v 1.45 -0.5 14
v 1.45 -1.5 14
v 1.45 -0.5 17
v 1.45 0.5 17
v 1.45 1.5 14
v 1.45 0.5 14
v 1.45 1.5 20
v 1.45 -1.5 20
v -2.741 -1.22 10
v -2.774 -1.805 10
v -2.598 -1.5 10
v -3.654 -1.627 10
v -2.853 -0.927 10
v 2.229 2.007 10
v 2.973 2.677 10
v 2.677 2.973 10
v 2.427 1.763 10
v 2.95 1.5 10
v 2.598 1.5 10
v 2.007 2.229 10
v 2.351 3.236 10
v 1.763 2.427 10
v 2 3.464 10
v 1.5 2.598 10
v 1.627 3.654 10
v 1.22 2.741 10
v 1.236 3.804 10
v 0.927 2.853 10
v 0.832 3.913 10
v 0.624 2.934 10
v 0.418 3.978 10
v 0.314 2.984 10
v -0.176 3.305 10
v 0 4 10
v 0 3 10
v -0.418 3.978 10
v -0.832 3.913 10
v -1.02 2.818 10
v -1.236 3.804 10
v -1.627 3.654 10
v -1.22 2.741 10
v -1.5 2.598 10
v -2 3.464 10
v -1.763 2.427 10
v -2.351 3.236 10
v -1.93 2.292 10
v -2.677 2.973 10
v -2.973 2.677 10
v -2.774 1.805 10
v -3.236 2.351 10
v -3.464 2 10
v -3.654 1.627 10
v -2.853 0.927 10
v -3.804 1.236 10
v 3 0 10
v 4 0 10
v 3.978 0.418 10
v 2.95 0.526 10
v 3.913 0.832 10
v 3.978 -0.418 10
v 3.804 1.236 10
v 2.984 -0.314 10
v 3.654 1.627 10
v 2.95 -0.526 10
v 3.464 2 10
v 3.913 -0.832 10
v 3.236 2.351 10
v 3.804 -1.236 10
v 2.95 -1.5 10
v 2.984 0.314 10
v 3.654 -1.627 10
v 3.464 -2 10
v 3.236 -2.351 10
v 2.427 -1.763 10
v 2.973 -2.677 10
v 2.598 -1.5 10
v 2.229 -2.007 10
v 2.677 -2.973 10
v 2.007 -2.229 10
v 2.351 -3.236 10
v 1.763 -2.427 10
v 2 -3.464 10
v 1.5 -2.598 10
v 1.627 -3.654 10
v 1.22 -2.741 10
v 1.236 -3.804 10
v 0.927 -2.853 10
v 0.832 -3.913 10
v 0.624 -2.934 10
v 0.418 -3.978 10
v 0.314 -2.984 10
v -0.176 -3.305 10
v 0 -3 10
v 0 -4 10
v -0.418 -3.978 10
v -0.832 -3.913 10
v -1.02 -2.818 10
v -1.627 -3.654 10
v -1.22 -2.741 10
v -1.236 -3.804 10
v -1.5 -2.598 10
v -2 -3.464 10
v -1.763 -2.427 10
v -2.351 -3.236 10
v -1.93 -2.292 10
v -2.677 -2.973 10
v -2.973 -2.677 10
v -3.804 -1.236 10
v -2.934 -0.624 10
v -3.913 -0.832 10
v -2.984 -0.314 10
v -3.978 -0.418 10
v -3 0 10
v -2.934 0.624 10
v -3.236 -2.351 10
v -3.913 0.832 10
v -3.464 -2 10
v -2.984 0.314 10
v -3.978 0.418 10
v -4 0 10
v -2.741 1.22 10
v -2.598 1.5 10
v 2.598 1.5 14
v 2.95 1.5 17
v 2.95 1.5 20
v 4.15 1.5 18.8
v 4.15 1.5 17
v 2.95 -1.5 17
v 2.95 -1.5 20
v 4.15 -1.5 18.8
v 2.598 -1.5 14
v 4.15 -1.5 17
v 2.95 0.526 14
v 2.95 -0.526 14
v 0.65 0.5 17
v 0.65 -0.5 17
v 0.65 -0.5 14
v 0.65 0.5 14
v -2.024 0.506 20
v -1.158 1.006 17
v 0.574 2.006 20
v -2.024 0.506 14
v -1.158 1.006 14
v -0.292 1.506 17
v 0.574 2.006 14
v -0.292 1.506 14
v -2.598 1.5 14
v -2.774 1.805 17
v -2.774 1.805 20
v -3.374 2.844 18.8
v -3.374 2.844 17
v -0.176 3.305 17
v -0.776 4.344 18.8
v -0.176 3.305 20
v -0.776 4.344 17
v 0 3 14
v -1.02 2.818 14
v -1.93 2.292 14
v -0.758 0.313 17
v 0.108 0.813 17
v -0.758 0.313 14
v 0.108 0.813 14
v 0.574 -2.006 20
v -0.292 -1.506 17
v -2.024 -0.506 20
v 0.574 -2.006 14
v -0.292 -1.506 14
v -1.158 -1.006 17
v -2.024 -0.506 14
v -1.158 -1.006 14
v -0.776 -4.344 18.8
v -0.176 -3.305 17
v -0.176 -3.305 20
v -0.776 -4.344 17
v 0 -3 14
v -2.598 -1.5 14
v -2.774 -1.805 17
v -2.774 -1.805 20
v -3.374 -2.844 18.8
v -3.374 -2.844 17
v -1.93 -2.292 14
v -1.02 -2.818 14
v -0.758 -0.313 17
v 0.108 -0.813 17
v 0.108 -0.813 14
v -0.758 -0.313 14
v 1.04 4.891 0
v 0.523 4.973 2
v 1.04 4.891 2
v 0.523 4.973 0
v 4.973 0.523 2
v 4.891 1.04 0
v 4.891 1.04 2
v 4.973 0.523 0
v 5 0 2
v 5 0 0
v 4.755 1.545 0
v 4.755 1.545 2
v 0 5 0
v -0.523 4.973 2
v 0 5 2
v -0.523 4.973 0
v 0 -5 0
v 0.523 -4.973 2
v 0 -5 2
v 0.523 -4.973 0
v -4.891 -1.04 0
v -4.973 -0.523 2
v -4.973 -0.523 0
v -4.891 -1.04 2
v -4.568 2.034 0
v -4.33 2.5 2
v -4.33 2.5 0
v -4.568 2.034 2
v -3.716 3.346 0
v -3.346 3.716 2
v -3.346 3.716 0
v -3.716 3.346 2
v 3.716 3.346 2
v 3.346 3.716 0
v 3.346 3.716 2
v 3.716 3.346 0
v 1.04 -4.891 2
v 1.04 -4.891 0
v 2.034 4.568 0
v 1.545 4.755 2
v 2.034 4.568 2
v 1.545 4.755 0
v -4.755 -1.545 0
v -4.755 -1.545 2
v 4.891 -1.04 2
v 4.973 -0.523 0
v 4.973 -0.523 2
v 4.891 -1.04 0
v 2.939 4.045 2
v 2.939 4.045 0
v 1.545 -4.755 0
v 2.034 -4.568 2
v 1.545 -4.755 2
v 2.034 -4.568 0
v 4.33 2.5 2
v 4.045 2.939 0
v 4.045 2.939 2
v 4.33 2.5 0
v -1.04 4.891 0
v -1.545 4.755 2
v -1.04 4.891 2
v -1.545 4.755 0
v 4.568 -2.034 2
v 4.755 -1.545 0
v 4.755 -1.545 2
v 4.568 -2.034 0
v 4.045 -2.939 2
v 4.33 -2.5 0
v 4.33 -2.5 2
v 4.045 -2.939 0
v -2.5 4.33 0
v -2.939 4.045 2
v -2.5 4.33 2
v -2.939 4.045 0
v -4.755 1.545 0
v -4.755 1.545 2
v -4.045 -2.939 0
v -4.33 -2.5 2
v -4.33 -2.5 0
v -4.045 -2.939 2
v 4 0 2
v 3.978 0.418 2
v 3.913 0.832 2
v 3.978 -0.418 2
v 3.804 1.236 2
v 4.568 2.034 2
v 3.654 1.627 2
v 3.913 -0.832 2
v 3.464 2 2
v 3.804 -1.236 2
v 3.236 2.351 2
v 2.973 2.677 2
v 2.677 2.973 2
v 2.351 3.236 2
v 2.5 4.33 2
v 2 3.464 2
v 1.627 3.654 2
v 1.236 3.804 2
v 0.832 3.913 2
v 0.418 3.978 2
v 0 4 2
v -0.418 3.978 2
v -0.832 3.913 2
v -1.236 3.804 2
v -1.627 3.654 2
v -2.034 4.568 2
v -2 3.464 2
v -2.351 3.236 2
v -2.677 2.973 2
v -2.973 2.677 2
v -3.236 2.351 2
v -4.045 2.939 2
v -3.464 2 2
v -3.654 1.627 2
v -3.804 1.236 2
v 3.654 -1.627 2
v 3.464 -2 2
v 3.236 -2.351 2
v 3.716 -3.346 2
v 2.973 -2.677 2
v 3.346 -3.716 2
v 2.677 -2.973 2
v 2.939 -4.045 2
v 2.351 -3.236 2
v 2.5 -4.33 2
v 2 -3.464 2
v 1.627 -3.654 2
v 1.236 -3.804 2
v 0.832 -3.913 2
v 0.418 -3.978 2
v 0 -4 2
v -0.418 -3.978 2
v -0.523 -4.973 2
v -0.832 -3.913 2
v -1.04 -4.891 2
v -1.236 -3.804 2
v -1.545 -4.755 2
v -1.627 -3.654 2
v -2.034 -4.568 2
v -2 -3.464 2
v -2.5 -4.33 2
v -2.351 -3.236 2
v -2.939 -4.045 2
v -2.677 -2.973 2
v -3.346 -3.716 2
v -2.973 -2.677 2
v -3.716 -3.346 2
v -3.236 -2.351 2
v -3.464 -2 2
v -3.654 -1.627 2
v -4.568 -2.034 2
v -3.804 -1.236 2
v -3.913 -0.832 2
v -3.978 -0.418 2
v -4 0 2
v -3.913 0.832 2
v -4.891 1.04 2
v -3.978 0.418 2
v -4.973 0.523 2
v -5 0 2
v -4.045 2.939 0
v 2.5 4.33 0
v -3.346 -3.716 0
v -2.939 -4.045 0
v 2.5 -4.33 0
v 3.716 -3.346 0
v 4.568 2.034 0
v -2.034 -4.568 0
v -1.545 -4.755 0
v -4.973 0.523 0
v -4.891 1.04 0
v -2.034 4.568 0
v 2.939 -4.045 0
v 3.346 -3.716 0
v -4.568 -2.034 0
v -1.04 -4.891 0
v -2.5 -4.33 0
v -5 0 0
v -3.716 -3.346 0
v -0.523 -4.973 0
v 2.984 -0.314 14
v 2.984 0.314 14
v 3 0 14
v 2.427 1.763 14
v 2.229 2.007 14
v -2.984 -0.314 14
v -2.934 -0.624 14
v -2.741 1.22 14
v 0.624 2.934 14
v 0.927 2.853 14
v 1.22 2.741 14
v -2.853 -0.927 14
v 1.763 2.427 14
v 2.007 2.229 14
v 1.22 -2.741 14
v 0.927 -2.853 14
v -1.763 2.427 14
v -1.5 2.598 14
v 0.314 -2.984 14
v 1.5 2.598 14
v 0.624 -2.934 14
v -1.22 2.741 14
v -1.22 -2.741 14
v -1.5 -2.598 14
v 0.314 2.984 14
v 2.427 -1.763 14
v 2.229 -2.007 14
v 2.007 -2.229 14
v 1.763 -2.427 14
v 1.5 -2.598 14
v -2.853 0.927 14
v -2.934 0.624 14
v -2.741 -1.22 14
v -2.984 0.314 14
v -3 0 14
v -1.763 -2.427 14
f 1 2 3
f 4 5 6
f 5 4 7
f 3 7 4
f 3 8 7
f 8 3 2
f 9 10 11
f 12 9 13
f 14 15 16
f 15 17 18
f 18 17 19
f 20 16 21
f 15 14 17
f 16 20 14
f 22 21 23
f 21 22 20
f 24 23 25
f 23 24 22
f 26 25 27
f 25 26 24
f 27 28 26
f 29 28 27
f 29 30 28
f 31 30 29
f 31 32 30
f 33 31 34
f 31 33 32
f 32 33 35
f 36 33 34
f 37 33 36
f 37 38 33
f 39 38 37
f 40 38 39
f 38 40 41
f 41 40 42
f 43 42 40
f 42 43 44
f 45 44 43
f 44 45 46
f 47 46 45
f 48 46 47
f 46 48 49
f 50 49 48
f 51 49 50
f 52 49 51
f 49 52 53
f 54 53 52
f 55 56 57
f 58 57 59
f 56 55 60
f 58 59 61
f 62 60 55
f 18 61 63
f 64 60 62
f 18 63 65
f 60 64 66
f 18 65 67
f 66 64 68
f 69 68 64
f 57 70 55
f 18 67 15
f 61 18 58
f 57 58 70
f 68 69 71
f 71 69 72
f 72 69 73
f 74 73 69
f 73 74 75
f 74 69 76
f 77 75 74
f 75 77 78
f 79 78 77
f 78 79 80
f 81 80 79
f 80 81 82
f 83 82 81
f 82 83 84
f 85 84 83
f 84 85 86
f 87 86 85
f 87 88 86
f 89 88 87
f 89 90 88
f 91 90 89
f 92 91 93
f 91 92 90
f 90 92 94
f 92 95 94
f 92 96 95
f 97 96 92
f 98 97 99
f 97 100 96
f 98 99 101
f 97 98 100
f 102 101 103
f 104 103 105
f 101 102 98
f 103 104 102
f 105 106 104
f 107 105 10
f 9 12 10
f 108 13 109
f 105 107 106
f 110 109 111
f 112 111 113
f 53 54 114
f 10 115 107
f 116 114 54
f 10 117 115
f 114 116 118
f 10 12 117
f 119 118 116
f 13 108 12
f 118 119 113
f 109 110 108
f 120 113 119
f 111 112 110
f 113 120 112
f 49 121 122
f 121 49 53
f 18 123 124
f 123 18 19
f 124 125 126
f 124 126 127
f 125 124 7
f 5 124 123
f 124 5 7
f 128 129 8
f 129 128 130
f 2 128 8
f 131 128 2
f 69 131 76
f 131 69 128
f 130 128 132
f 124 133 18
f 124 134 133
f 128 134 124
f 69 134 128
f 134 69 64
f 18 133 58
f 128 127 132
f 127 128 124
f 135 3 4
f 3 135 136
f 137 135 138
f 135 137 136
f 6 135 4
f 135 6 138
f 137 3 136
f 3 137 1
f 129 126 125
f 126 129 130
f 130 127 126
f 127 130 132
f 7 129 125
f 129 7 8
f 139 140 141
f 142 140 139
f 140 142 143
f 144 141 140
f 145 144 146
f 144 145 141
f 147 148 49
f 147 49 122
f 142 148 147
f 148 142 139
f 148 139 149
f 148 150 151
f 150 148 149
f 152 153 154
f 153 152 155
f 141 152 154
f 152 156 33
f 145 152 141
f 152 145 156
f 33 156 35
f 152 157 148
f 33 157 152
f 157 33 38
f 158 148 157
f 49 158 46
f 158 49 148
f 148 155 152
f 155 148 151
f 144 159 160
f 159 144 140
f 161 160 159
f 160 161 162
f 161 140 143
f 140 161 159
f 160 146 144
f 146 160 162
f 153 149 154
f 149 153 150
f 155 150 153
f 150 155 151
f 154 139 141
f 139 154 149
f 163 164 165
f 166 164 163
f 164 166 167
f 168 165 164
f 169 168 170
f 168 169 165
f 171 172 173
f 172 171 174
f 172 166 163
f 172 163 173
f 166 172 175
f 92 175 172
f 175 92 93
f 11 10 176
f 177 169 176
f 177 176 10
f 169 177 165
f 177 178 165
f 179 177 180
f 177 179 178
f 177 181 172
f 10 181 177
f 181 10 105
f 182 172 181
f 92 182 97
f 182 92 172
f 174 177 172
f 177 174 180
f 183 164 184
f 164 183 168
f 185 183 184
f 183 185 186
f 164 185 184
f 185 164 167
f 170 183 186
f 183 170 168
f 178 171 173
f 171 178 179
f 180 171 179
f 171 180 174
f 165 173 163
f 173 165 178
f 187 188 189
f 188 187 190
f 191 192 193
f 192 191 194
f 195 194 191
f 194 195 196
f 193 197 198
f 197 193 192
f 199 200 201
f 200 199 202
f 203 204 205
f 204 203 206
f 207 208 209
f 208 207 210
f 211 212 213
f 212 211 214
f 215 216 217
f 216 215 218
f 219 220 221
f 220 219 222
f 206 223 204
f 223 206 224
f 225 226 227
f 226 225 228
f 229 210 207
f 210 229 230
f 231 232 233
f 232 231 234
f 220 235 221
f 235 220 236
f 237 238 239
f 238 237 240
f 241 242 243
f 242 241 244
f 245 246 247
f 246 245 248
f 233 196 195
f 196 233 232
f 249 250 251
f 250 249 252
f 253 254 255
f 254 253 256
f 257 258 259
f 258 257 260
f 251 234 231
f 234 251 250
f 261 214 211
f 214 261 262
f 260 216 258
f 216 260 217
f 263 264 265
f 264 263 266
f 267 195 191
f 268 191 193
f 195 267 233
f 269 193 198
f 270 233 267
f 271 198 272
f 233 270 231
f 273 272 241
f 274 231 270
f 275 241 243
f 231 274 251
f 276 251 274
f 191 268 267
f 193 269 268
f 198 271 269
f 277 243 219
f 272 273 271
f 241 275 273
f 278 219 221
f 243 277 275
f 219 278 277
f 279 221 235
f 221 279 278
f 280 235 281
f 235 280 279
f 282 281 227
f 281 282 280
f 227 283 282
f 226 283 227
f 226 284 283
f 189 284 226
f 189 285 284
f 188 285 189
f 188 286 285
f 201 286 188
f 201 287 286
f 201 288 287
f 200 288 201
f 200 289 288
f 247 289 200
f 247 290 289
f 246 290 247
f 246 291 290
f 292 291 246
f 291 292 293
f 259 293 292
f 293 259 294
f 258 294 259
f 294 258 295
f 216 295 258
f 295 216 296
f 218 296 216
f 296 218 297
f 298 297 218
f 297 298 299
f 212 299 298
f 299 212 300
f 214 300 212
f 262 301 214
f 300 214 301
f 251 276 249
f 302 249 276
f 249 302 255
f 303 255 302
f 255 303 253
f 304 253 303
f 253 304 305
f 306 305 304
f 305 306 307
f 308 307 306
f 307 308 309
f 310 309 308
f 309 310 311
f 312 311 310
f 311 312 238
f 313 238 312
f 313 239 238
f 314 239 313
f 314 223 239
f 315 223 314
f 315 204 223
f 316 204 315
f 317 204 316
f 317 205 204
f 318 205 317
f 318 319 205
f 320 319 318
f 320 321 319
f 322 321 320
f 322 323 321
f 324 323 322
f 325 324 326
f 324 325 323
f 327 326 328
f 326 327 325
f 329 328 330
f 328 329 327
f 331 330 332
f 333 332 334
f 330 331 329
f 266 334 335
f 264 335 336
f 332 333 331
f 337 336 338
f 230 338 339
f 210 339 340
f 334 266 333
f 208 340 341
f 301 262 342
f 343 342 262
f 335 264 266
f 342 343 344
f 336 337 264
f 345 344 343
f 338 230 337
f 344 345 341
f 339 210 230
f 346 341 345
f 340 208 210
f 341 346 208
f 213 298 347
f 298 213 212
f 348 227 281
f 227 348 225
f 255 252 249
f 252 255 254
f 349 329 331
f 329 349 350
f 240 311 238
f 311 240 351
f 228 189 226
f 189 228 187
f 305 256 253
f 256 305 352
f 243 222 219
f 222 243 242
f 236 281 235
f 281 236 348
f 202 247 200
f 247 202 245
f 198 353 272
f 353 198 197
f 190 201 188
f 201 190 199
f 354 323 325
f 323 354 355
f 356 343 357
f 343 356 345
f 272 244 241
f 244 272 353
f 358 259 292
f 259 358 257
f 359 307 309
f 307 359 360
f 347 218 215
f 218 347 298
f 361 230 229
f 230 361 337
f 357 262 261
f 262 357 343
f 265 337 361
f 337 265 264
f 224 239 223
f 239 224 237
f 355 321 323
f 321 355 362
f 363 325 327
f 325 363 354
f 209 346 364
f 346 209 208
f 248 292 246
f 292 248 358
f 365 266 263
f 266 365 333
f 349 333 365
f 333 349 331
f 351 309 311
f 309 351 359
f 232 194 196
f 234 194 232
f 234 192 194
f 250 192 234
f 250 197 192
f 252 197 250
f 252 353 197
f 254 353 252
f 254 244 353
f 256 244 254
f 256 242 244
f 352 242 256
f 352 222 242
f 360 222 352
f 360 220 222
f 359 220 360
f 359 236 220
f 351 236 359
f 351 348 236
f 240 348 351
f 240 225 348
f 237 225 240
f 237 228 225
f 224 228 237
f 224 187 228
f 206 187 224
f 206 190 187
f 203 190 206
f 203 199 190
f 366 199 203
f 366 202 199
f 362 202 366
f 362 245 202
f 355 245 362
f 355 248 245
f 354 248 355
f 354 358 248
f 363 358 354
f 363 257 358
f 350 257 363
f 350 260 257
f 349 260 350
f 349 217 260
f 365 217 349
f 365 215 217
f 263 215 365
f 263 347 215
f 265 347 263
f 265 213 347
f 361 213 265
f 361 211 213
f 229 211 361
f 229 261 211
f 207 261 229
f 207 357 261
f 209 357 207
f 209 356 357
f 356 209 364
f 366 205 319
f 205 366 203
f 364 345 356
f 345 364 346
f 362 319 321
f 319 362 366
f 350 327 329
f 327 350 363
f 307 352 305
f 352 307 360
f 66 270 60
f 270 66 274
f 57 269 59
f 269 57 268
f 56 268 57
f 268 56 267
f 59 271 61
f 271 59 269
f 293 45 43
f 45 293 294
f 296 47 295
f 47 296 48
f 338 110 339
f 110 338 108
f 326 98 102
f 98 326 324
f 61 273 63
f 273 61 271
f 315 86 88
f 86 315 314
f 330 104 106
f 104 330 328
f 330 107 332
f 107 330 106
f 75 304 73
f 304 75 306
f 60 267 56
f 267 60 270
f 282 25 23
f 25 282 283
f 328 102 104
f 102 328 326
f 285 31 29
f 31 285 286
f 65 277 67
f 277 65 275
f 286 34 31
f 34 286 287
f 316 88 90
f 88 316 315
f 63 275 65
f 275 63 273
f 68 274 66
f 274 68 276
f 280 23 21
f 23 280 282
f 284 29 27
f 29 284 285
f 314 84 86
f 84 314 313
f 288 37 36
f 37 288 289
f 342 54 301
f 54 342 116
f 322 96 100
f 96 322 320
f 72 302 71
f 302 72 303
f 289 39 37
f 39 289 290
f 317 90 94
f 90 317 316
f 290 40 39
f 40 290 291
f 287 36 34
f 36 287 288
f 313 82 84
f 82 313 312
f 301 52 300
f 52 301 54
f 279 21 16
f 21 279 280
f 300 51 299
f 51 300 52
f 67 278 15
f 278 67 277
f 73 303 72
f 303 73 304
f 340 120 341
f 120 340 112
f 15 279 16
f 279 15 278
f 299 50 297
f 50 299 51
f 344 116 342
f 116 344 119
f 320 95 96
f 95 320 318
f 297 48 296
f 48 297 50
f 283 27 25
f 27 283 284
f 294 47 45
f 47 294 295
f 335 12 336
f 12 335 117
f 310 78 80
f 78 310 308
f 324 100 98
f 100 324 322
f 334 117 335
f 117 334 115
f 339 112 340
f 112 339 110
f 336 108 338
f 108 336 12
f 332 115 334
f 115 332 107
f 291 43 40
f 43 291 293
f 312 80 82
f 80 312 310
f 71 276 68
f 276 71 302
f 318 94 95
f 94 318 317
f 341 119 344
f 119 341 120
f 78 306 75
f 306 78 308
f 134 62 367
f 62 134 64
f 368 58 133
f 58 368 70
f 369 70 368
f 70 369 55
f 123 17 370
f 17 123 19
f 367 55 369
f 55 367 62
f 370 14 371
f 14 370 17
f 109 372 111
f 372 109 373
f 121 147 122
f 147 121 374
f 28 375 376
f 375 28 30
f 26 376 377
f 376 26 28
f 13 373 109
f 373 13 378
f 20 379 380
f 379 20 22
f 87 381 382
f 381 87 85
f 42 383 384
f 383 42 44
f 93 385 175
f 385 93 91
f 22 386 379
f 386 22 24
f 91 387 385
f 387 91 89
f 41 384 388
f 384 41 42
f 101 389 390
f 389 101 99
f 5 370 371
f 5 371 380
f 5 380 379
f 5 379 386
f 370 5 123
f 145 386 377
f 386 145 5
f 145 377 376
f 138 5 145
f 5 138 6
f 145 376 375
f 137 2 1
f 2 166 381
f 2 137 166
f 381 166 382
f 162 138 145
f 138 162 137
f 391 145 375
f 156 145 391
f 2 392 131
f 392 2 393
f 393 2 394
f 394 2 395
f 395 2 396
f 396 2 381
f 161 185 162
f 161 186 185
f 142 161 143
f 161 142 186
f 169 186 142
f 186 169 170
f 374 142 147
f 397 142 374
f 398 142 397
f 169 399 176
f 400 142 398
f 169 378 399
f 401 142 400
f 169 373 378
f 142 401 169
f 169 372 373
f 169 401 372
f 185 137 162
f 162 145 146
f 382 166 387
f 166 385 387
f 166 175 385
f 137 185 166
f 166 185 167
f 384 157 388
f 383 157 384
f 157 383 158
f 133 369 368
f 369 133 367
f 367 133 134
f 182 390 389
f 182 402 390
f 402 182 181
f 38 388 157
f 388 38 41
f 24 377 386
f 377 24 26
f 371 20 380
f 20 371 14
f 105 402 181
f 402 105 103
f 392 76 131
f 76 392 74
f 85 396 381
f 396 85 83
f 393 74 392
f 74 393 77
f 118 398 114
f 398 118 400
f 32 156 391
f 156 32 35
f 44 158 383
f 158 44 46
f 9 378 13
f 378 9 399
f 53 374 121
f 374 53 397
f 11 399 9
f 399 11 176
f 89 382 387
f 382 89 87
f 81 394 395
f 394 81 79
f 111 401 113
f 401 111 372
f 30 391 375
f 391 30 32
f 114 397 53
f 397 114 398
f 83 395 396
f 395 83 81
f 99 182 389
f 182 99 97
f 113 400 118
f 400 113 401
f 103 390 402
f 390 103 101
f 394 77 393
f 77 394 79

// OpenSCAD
// ==========================================
// Whirlpool Refrigerator Pan Roller - AXLE
// Part Number: W11573594
// Material: TPU (flexible for snap-fit)
// ==========================================

$fn = 60;

// AXLE PARAMETERS (20mm total)
axle_shaft_d = 8;
axle_shaft_h = 8;
axle_shoulder_d = 10;
axle_shoulder_h = 2;
leg_length = 10;

// Leg geometry
leg_width = 3;
leg_thickness = 1.5;
leg_offset = 2.2;
fillet_r = 1.0;

// Rib reinforcement
rib_width = 1.0;
rib_height = 0.8;

// Wedge
wedge_height = 3;
wedge_extension = 1.2;

echo("=== W11573594 PAN ROLLER AXLE ===");
echo("Total height: 20mm");
echo("Shoulder:", axle_shoulder_d, "x", axle_shoulder_h, "mm");
echo("Shaft:", axle_shaft_d, "x", axle_shaft_h, "mm");
echo("Legs: 3 at 120°");
echo("Material: TPU");

module axle() {
    // Shoulder at BOTTOM (print bed)
    cylinder(h = axle_shoulder_h, d = axle_shoulder_d);
    
    // Main shaft
    translate([0, 0, axle_shoulder_h])
        cylinder(h = axle_shaft_h, d = axle_shaft_d);
    
    // Center core for leg attachment
    translate([0, 0, axle_shoulder_h + axle_shaft_h])
        cylinder(h = 4, d = 6);
    
    // Three legs at 120°
    for (angle = [0, 120, 240]) {
        rotate([0, 0, angle])
            translate([leg_offset, 0, axle_shoulder_h + axle_shaft_h])
                leg_with_wedge();
    }
}

module leg_with_wedge() {
    // Main leg body
    translate([-leg_thickness/2, -leg_width/2, 0])
        cube([leg_thickness, leg_width, leg_length - wedge_height]);
    
    // Center rib
    translate([-leg_thickness/2 - rib_height, -rib_width/2, 0])
        cube([rib_height, rib_width, leg_length - wedge_height]);
    
    // Fillet at base
    fillet();
    
    // Solid wedge at tip
    translate([0, 0, leg_length - wedge_height])
        solid_wedge();
}

module fillet() {
    difference() {
        translate([-leg_thickness/2 - fillet_r, -leg_width/2, 0])
            cube([fillet_r, leg_width, fillet_r]);
        translate([-leg_thickness/2 - fillet_r, -leg_width/2 - 0.1, fillet_r])
            rotate([-90, 0, 0])
                cylinder(h = leg_width + 0.2, r = fillet_r);
    }
}

module solid_wedge() {
    polyhedron(
        points = [
            [-leg_thickness/2, -leg_width/2, 0],
            [-leg_thickness/2, leg_width/2, 0],
            [-leg_thickness/2, leg_width/2, wedge_height],
            [-leg_thickness/2, -leg_width/2, wedge_height],
            [leg_thickness/2, -leg_width/2, 0],
            [leg_thickness/2, leg_width/2, 0],
            [leg_thickness/2, leg_width/2, wedge_height],
            [leg_thickness/2, -leg_width/2, wedge_height],
            [leg_thickness/2 + wedge_extension, -leg_width/2, 0],
            [leg_thickness/2 + wedge_extension, leg_width/2, 0],
            [leg_thickness/2 + wedge_extension, leg_width/2, wedge_height * 0.6],
            [leg_thickness/2 + wedge_extension, -leg_width/2, wedge_height * 0.6],
        ],
        faces = [
            [0, 1, 2, 3],
            [0, 4, 5, 1],
            [4, 8, 9, 5],
            [0, 3, 7, 4],
            [4, 7, 11, 8],
            [1, 5, 6, 2],
            [5, 9, 10, 6],
            [3, 2, 6, 7],
            [7, 6, 10, 11],
            [8, 11, 10, 9],
        ]
    );
}

axle();
